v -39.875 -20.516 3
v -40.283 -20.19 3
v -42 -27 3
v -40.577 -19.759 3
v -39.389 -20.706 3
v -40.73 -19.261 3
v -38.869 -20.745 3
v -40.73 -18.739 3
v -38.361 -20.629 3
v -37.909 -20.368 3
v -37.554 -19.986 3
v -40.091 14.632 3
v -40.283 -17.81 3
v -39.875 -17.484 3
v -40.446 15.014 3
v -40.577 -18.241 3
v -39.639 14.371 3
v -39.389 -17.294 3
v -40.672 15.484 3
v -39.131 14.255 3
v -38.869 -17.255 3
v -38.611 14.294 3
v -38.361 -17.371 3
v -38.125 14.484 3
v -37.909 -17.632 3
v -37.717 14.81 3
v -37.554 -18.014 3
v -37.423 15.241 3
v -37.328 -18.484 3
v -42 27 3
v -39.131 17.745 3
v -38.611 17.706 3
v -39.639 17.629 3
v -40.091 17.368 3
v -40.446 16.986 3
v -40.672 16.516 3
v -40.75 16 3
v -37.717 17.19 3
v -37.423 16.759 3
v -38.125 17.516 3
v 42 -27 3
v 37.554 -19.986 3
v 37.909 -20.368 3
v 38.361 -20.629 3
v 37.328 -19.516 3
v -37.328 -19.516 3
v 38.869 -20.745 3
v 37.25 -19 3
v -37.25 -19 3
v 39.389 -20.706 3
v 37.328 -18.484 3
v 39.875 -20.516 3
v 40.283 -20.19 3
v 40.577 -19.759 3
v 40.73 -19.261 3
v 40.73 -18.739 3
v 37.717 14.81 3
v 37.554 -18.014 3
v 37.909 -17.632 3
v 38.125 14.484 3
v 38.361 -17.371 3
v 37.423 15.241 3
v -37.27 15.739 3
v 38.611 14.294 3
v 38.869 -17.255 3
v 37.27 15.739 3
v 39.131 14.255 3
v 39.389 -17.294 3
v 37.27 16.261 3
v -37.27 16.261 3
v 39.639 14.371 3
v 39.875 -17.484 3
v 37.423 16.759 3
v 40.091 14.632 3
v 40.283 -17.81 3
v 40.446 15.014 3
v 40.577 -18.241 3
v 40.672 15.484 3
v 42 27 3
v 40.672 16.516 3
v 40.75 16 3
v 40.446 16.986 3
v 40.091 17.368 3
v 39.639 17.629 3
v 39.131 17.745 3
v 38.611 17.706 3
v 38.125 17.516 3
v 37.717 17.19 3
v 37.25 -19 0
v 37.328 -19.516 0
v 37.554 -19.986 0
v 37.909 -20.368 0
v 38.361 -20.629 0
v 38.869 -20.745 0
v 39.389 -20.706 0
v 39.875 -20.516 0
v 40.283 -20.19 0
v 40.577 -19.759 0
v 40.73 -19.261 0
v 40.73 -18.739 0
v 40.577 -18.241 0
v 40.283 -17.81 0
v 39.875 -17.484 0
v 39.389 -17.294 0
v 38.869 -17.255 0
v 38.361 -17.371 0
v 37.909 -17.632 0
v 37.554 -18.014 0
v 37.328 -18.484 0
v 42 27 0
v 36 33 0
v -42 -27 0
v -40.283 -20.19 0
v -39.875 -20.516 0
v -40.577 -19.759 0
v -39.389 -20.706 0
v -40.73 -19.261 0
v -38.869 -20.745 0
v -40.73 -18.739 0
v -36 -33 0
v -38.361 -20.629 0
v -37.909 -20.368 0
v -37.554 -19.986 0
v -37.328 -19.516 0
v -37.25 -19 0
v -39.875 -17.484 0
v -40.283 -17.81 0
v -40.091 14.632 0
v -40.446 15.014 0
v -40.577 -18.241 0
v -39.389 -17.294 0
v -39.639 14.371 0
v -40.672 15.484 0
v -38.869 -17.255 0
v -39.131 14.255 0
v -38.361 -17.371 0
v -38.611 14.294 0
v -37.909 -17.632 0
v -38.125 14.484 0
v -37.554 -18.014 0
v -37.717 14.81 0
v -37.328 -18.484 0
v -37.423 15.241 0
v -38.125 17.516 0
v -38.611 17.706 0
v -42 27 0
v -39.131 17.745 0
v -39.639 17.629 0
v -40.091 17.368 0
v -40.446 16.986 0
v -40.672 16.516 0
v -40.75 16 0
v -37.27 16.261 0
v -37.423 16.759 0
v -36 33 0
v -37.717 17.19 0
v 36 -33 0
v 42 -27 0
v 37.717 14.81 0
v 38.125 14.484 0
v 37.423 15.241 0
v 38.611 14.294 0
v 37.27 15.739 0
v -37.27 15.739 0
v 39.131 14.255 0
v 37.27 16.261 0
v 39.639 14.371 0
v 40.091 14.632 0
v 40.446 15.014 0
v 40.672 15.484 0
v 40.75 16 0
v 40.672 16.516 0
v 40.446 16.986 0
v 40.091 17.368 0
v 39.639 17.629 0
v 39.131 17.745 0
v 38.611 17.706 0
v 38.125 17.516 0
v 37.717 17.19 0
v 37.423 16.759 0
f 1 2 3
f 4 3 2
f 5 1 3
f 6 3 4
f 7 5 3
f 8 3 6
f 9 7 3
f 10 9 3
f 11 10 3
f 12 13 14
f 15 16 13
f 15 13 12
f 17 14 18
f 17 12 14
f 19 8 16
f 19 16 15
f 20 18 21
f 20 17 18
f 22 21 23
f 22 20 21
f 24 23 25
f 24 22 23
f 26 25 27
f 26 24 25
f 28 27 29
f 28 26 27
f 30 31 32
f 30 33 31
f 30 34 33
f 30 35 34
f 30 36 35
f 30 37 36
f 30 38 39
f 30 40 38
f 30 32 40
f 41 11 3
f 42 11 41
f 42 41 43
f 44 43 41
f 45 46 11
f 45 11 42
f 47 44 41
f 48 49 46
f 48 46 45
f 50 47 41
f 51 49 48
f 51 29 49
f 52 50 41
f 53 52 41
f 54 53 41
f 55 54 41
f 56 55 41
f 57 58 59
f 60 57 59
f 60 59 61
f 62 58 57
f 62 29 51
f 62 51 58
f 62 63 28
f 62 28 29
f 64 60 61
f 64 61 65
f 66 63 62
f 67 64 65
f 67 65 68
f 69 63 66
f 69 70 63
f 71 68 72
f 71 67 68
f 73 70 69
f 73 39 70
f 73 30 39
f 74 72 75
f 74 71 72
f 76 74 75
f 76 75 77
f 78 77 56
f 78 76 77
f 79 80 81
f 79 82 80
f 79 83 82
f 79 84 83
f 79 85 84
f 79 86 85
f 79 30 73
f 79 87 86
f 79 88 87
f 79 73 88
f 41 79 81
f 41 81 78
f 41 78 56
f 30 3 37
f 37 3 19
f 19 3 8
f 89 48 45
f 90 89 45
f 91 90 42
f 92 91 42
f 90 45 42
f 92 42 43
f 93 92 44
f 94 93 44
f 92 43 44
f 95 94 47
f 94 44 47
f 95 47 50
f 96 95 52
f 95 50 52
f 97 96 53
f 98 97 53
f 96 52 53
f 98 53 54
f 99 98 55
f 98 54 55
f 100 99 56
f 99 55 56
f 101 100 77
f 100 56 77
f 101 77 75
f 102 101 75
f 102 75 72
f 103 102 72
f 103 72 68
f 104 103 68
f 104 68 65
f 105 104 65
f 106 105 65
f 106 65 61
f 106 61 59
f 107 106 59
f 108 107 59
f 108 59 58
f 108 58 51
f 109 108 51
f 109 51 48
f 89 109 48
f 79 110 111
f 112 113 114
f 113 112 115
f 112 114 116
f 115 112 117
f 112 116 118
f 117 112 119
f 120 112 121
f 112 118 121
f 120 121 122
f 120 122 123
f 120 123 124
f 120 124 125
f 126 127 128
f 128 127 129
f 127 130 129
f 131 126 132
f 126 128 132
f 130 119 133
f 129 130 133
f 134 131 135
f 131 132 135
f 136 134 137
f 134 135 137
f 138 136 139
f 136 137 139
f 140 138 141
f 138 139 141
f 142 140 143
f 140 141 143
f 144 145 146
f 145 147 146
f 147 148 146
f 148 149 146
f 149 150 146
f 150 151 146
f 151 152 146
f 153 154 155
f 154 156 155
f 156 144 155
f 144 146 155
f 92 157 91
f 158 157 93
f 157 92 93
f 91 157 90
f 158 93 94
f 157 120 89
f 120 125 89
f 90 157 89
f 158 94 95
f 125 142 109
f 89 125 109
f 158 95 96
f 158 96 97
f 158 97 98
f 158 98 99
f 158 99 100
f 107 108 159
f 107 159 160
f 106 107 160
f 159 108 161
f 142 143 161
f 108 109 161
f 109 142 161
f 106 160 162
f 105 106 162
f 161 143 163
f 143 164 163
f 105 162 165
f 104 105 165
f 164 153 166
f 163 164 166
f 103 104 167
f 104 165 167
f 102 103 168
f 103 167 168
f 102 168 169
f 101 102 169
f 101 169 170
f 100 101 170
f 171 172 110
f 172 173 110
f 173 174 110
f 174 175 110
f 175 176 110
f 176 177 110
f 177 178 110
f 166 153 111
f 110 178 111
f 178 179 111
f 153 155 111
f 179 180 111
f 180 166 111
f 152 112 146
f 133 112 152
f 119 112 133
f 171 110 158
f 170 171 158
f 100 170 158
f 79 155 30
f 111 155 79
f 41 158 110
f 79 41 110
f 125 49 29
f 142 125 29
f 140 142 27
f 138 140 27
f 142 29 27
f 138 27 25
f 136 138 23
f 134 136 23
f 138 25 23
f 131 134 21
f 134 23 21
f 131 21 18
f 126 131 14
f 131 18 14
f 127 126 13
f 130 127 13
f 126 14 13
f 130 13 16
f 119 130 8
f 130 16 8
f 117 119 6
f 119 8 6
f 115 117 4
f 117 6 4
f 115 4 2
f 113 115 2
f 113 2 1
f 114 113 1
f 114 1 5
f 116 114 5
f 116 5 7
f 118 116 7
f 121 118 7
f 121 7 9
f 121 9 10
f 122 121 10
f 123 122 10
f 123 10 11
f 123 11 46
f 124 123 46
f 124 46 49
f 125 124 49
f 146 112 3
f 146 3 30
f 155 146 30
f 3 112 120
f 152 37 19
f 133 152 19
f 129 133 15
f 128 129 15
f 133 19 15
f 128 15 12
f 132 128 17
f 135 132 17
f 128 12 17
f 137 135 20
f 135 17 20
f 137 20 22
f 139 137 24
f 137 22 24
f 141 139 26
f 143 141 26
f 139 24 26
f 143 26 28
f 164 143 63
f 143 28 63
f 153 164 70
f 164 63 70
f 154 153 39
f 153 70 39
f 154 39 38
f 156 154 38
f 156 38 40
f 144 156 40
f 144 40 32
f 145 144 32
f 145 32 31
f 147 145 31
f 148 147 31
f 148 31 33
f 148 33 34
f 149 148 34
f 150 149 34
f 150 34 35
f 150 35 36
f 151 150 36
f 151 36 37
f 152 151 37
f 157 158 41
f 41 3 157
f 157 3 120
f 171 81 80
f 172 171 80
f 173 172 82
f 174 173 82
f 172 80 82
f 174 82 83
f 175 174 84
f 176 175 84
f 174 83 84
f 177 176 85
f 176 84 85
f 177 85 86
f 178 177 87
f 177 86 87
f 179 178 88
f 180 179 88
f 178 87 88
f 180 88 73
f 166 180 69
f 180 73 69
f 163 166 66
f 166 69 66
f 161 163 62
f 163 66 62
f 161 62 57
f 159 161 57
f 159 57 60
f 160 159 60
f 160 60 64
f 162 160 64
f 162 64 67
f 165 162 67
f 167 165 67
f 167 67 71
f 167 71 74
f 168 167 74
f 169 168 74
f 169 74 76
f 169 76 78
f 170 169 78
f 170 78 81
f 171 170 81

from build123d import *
from OCP.BRepFilletAPI import BRepFilletAPI_MakeChamfer

# Parameters (mm, degrees)
SKETCH1_W           = 84
SKETCH1_H           = 66
BOSS_EXTRUDE1_DEPTH = 3
CHAMFER2_SIZE       = 6
CHAMFER4_SIZE       = 3
CHAMFER4_SIZE_2     = 6
SKETCH2_R           = 1.75
CUT_EXTRUDE1_DEPTH  = 54.4976635


with BuildPart() as part:
    # Sketch1 → Boss-Extrude1 (new body)
    with BuildSketch(Plane.XY):
        Rectangle(SKETCH1_W, SKETCH1_H)
    extrude(amount=BOSS_EXTRUDE1_DEPTH)

    # Chamfer2
    chamfer2_edges = [part.edges().sort_by_distance(p)[0] for p in [
        (42, -33, 1.5),
        (-42, -33, 1.5),
        (-42, 33, 1.5),
        (42, 33, 1.5),
    ]]
    chamfer(chamfer2_edges, length=CHAMFER2_SIZE)

    # Chamfer4
    chamfer4_edges_1 = [part.edges().sort_by_distance(p)[0] for p in [
        (0, -33, 3),
    ]]
    chamfer4_side_1 = [part.faces().sort_by_distance(p)[0] for p in [
        (0, -33, 2.94),
    ]]
    chamfer4_edges_2 = [part.edges().sort_by_distance(p)[0] for p in [
        (0, 33, 3),
    ]]
    chamfer4_side_2 = [part.faces().sort_by_distance(p)[0] for p in [
        (0, 32.94, 3),
    ]]
    chamfer4 = BRepFilletAPI_MakeChamfer(part.part.solid().wrapped)
    for e in chamfer4_edges_1:
        chamfer4.Add(CHAMFER4_SIZE - 0.0001, CHAMFER4_SIZE_2 - 0.0001, e.wrapped, chamfer4_side_1[0].wrapped)
    for e in chamfer4_edges_2:
        chamfer4.Add(CHAMFER4_SIZE_2 - 0.0001, CHAMFER4_SIZE - 0.0001, e.wrapped, chamfer4_side_2[0].wrapped)
    add(Compound.cast(chamfer4.Shape()), mode=Mode.REPLACE)  # a hair under: the kernel refuses the full size

    # Sketch2 → Cut-Extrude1 (cut, through all)
    with BuildSketch(Plane.XY.offset(3)):
        with Locations((-39, -19)):
            Circle(SKETCH2_R)
        with Locations(Location((39, -19, 0), (0, 0, 180))):
            Circle(SKETCH2_R)
        with Locations((39, 16)):
            Circle(SKETCH2_R)
        with Locations(Location((-39, 16, 0), (0, 0, 180))):
            Circle(SKETCH2_R)
    extrude(amount=-CUT_EXTRUDE1_DEPTH, mode=Mode.SUBTRACT)


solid = part.part
